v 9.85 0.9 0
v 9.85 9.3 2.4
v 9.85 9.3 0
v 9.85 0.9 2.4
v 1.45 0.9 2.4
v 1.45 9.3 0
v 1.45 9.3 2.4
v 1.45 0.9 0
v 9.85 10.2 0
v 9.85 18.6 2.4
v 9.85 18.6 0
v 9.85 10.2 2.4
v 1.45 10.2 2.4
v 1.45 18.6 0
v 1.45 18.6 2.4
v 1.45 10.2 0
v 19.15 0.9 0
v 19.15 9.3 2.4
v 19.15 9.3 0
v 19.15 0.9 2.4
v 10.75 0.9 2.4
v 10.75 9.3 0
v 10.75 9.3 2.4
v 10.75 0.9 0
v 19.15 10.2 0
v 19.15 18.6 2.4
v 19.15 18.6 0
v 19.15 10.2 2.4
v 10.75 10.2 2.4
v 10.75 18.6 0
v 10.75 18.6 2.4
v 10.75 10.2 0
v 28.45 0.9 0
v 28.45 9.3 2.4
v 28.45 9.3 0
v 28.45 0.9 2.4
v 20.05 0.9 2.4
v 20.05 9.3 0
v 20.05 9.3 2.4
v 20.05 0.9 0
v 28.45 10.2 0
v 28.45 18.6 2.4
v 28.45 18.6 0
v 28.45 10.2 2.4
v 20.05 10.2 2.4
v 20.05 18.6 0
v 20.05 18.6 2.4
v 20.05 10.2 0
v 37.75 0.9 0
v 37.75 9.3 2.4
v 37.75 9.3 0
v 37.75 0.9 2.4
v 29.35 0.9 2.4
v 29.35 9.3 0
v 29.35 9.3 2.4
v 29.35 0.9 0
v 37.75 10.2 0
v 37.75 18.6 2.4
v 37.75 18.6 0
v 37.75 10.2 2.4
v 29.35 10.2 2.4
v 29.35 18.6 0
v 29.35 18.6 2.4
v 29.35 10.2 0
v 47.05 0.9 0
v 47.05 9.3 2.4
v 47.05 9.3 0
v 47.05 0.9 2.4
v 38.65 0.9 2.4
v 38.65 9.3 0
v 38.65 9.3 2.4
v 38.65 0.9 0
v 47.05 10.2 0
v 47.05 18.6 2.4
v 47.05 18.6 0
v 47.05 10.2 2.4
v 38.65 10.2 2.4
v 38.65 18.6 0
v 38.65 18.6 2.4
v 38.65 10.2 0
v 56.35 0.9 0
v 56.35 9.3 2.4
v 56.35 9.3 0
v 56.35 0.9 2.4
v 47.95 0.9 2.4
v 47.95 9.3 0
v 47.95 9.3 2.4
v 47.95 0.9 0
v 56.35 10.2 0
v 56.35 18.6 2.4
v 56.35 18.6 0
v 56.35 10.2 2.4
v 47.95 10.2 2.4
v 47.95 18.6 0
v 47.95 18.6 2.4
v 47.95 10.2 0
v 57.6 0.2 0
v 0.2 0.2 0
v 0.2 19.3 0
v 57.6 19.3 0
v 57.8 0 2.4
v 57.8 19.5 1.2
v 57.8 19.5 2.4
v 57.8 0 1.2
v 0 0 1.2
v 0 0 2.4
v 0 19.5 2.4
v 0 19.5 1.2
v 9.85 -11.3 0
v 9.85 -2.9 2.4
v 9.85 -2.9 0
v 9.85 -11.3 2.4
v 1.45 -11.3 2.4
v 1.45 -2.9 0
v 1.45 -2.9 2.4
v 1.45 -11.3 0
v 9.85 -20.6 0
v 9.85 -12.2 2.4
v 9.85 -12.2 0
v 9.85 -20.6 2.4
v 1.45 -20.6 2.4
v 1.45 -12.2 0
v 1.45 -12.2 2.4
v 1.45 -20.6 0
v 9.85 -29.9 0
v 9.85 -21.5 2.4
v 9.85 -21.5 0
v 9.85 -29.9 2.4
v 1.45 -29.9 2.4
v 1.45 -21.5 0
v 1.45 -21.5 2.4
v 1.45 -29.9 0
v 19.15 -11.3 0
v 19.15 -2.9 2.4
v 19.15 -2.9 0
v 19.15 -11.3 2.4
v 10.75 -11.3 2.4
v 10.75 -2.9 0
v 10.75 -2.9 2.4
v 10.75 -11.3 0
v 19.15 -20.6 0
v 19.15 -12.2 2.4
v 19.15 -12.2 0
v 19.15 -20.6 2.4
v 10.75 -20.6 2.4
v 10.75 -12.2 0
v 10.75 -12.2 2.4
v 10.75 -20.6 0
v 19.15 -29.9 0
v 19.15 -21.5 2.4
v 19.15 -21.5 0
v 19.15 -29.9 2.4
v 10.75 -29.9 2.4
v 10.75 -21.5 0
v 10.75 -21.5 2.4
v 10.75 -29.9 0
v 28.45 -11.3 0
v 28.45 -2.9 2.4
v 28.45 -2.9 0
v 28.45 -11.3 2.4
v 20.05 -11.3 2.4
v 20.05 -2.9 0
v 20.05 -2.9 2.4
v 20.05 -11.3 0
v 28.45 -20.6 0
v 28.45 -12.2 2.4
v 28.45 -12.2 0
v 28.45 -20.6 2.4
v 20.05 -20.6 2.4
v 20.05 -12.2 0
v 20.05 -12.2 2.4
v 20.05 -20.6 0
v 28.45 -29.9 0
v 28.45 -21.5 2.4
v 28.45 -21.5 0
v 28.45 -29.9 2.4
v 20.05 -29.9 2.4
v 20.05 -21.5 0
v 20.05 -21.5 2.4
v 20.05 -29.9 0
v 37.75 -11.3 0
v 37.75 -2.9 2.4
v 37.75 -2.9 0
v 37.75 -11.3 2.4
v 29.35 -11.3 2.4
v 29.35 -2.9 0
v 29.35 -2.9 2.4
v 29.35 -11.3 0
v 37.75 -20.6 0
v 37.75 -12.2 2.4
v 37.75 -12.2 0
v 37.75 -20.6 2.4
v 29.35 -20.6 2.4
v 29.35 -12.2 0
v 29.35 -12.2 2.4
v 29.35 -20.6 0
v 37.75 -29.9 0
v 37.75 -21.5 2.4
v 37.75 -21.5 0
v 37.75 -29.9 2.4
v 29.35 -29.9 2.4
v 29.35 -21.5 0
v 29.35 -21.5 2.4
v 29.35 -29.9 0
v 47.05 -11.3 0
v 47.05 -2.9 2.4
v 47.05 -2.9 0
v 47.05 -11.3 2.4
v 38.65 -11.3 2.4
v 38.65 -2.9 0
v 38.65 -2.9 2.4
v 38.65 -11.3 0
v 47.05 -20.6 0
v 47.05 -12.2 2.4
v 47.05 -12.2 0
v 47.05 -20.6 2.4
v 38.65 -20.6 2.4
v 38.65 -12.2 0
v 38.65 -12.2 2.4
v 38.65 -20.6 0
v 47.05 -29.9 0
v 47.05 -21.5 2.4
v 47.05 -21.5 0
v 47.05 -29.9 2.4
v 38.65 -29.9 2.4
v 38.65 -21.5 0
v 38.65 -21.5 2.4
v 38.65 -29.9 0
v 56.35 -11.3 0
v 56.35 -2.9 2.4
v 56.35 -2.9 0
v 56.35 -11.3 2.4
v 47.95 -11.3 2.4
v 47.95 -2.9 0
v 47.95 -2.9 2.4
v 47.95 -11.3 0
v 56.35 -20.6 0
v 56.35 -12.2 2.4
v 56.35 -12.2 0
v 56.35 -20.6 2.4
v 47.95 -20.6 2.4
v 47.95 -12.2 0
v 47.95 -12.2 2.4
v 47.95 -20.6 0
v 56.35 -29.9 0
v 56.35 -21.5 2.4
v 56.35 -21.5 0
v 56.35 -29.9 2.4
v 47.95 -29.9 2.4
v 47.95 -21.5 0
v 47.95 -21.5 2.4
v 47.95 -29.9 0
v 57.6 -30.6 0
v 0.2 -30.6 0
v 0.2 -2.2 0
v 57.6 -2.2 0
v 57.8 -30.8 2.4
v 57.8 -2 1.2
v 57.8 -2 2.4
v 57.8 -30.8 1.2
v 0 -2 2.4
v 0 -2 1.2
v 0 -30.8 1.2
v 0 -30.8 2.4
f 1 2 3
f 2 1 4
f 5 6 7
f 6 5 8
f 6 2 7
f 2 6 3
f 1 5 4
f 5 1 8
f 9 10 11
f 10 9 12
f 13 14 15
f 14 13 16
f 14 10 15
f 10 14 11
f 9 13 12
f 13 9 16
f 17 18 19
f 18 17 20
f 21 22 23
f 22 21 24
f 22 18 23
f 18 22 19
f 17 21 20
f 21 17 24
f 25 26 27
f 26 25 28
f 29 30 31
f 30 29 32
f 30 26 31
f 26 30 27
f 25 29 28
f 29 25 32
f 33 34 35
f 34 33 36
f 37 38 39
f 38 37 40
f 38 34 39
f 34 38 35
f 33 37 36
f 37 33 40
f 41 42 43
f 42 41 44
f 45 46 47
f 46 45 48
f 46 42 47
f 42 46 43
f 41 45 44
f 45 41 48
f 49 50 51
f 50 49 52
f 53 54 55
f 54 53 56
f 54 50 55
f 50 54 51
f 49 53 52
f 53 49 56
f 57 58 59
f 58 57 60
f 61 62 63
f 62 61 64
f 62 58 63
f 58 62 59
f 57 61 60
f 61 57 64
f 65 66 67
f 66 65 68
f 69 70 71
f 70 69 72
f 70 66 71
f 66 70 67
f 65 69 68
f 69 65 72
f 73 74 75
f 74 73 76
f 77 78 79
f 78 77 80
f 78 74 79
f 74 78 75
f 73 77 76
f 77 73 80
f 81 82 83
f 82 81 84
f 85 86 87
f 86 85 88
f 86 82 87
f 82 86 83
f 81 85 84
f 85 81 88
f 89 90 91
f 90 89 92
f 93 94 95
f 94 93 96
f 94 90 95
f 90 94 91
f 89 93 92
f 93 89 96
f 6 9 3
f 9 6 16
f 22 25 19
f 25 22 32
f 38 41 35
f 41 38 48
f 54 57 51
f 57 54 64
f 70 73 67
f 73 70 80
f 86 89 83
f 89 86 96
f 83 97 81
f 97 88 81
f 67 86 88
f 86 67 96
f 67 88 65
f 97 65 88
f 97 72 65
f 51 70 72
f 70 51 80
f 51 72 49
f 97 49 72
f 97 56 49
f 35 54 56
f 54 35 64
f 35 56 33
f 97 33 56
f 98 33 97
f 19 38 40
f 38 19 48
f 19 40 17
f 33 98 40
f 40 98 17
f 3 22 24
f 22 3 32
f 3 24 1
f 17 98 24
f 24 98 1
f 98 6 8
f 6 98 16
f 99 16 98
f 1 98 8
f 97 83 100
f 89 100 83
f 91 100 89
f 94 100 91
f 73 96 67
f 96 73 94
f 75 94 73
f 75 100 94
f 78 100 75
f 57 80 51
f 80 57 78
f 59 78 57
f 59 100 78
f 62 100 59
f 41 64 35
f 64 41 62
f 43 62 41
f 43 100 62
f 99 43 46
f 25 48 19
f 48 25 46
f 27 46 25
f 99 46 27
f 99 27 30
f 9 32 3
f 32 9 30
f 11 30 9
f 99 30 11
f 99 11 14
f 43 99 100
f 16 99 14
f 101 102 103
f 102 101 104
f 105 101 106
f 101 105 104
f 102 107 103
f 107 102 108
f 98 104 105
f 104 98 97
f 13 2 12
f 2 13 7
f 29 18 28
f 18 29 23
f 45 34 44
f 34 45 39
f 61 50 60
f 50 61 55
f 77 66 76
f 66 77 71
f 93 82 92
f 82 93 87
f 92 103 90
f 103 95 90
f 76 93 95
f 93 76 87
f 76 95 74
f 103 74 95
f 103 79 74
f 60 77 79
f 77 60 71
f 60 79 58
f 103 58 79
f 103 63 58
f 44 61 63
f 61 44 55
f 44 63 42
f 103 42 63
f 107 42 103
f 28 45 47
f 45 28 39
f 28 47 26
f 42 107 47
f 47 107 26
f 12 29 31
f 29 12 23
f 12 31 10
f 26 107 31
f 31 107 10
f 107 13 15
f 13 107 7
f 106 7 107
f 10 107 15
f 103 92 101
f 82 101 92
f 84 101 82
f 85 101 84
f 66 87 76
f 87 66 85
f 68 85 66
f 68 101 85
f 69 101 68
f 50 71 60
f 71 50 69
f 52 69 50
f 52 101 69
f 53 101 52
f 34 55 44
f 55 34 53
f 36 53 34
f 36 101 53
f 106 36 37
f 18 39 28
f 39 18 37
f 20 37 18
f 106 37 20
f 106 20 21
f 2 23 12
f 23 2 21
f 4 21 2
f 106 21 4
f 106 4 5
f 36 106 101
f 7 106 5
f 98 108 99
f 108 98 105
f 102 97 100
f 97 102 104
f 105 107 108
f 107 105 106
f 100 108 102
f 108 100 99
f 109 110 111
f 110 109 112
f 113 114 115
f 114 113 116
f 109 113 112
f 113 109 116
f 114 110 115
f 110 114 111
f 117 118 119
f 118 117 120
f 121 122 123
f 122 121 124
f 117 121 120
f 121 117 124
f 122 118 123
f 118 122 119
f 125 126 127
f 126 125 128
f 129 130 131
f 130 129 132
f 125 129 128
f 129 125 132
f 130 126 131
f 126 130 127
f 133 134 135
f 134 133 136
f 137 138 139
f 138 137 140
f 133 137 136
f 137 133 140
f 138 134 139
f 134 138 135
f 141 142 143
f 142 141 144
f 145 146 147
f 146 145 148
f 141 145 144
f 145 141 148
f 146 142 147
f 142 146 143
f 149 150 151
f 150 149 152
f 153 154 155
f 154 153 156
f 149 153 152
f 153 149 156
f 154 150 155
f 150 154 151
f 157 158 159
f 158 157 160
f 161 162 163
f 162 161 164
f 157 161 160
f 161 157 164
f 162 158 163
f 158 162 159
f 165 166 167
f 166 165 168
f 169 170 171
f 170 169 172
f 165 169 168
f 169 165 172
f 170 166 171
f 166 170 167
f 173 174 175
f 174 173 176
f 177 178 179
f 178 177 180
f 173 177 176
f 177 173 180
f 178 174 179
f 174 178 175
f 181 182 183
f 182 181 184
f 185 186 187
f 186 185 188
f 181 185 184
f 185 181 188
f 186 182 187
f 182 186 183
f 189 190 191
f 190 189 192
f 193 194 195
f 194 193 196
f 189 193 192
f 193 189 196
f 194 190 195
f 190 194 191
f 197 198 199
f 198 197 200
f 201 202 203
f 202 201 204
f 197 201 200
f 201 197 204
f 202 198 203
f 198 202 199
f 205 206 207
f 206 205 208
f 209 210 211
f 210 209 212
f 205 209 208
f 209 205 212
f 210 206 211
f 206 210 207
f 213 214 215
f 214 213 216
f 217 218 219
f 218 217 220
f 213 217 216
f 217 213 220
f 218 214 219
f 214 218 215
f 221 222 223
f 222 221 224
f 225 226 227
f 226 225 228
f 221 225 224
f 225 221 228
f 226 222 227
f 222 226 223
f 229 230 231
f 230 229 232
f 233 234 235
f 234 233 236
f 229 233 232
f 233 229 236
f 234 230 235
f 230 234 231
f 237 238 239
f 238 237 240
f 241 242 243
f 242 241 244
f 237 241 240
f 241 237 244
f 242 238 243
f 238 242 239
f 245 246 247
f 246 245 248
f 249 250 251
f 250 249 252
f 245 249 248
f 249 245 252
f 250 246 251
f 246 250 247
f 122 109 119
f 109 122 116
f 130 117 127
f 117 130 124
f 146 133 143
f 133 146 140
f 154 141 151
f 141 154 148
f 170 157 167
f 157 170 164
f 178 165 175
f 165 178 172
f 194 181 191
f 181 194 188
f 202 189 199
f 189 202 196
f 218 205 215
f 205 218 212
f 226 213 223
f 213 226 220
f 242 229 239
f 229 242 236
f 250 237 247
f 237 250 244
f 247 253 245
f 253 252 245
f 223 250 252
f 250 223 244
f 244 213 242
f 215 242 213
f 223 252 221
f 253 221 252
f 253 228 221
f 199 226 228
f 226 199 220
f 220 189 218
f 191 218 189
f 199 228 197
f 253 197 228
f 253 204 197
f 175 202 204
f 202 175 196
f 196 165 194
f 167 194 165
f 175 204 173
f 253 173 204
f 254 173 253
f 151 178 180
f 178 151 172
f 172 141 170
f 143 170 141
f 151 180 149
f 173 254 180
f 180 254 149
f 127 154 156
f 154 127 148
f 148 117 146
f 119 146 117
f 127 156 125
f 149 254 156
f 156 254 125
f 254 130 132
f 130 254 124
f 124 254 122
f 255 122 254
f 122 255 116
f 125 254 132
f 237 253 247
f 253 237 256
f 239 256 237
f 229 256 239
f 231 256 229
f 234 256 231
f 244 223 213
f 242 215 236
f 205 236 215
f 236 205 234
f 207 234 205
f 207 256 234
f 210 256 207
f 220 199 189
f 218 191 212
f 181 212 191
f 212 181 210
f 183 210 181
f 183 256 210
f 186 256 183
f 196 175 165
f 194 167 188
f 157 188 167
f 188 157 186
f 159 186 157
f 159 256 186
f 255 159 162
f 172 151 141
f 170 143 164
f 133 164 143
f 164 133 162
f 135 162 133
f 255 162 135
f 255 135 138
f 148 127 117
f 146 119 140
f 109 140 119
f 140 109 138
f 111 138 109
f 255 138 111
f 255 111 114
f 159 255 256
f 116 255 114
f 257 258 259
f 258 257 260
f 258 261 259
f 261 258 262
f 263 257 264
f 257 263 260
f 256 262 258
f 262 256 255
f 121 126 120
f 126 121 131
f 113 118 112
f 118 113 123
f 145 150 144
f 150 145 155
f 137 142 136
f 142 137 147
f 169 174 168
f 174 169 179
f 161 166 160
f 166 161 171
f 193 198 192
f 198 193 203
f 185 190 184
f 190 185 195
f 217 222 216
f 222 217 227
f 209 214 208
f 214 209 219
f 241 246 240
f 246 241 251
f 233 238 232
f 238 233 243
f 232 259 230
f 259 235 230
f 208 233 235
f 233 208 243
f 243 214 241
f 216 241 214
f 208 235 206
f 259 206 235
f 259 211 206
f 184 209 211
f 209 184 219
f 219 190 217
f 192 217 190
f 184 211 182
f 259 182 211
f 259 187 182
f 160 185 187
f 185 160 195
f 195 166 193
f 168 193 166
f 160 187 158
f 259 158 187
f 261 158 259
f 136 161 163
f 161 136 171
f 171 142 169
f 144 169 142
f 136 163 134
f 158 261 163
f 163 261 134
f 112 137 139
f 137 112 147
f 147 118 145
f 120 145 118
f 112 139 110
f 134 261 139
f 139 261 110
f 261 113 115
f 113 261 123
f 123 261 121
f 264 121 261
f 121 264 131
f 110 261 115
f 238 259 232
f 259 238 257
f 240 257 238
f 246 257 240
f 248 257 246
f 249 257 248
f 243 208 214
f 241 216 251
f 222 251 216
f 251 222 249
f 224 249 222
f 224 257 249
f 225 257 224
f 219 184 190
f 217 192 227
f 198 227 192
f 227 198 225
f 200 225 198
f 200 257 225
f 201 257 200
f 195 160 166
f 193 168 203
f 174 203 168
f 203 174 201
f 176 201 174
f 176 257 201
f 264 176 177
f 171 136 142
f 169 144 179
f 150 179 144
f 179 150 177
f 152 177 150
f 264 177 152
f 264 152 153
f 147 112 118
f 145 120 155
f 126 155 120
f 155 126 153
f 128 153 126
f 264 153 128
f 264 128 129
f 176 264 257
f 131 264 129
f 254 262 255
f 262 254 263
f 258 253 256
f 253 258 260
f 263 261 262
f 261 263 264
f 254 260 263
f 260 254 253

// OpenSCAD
//CUSTOMIZER VARIABLES

// General allowance in x direction (mm)
allowance_x = 0.0;
// General allowance in y direction (mm)
allowance_y = 0.0;
// Chamfer at grid bottom left/right x distance (mm)
chamfer_x = 0.2;
// Chamfer at grid bottom front/back y distance (mm)
chamfer_y = 0.2;
// Chamfer at grid bottom z distance (mm); grid height is 2.4 mm
chamfer_z = 1.2;

//CUSTOMIZER VARIABLES END

module grid(x, y) {

    square = 8.4;
    height = 2.4;
    strut = 0.9;
    xextra = 1.1;
    
    width = x * (square + strut) + strut + xextra;
    depth = y * (square + strut) + strut;
    
    points = [
        [     0 + allowance_x + chamfer_x,     0 + allowance_y + chamfer_y, 0 ],
        [ width - allowance_x - chamfer_x,     0 + allowance_y + chamfer_y, 0 ],
        [ width - allowance_x - chamfer_x, depth - allowance_y - chamfer_y, 0 ],
        [     0 + allowance_x + chamfer_x, depth - allowance_y - chamfer_y, 0 ],

        [     0 + allowance_x,     0 + allowance_y, chamfer_z ],
        [ width - allowance_x,     0 + allowance_y, chamfer_z ],
        [ width - allowance_x, depth - allowance_y, chamfer_z ],
        [     0 + allowance_x, depth - allowance_y, chamfer_z ],

        [     0 + allowance_x,     0 + allowance_y, height ],
        [ width - allowance_x,     0 + allowance_y, height ],
        [ width - allowance_x, depth - allowance_y, height ],
        [     0 + allowance_x, depth - allowance_y, height ]
    ];
    
    faces = [
        [0,1,2,3],   // bottom

        [4,5,1,0],   // chamfer front
        [5,6,2,1],   // chamfer right
        [6,7,3,2],   // chamfer back
        [7,4,0,3],   // chamfer left

        [8,9,5,4],   // front
        [9,10,6,5],  // right
        [10,11,7,6], // back
        [11,8,4,7],  // left
        
        [11,10,9,8] // top
    ];
    
    difference() { 
        polyhedron(points, faces);
        for (i = [0:x-1]) {
            translate([i * (square + strut) + strut + xextra/2, 0, 0])
            for (i = [0:y-1]) {
                translate([0, i * (square + strut) + strut, -1]) 
                cube(square, height+2);
            }
        }
    }
}

grid(6,2);
mirror([0,1,0])
translate([0,2,0])
grid(6,3);
